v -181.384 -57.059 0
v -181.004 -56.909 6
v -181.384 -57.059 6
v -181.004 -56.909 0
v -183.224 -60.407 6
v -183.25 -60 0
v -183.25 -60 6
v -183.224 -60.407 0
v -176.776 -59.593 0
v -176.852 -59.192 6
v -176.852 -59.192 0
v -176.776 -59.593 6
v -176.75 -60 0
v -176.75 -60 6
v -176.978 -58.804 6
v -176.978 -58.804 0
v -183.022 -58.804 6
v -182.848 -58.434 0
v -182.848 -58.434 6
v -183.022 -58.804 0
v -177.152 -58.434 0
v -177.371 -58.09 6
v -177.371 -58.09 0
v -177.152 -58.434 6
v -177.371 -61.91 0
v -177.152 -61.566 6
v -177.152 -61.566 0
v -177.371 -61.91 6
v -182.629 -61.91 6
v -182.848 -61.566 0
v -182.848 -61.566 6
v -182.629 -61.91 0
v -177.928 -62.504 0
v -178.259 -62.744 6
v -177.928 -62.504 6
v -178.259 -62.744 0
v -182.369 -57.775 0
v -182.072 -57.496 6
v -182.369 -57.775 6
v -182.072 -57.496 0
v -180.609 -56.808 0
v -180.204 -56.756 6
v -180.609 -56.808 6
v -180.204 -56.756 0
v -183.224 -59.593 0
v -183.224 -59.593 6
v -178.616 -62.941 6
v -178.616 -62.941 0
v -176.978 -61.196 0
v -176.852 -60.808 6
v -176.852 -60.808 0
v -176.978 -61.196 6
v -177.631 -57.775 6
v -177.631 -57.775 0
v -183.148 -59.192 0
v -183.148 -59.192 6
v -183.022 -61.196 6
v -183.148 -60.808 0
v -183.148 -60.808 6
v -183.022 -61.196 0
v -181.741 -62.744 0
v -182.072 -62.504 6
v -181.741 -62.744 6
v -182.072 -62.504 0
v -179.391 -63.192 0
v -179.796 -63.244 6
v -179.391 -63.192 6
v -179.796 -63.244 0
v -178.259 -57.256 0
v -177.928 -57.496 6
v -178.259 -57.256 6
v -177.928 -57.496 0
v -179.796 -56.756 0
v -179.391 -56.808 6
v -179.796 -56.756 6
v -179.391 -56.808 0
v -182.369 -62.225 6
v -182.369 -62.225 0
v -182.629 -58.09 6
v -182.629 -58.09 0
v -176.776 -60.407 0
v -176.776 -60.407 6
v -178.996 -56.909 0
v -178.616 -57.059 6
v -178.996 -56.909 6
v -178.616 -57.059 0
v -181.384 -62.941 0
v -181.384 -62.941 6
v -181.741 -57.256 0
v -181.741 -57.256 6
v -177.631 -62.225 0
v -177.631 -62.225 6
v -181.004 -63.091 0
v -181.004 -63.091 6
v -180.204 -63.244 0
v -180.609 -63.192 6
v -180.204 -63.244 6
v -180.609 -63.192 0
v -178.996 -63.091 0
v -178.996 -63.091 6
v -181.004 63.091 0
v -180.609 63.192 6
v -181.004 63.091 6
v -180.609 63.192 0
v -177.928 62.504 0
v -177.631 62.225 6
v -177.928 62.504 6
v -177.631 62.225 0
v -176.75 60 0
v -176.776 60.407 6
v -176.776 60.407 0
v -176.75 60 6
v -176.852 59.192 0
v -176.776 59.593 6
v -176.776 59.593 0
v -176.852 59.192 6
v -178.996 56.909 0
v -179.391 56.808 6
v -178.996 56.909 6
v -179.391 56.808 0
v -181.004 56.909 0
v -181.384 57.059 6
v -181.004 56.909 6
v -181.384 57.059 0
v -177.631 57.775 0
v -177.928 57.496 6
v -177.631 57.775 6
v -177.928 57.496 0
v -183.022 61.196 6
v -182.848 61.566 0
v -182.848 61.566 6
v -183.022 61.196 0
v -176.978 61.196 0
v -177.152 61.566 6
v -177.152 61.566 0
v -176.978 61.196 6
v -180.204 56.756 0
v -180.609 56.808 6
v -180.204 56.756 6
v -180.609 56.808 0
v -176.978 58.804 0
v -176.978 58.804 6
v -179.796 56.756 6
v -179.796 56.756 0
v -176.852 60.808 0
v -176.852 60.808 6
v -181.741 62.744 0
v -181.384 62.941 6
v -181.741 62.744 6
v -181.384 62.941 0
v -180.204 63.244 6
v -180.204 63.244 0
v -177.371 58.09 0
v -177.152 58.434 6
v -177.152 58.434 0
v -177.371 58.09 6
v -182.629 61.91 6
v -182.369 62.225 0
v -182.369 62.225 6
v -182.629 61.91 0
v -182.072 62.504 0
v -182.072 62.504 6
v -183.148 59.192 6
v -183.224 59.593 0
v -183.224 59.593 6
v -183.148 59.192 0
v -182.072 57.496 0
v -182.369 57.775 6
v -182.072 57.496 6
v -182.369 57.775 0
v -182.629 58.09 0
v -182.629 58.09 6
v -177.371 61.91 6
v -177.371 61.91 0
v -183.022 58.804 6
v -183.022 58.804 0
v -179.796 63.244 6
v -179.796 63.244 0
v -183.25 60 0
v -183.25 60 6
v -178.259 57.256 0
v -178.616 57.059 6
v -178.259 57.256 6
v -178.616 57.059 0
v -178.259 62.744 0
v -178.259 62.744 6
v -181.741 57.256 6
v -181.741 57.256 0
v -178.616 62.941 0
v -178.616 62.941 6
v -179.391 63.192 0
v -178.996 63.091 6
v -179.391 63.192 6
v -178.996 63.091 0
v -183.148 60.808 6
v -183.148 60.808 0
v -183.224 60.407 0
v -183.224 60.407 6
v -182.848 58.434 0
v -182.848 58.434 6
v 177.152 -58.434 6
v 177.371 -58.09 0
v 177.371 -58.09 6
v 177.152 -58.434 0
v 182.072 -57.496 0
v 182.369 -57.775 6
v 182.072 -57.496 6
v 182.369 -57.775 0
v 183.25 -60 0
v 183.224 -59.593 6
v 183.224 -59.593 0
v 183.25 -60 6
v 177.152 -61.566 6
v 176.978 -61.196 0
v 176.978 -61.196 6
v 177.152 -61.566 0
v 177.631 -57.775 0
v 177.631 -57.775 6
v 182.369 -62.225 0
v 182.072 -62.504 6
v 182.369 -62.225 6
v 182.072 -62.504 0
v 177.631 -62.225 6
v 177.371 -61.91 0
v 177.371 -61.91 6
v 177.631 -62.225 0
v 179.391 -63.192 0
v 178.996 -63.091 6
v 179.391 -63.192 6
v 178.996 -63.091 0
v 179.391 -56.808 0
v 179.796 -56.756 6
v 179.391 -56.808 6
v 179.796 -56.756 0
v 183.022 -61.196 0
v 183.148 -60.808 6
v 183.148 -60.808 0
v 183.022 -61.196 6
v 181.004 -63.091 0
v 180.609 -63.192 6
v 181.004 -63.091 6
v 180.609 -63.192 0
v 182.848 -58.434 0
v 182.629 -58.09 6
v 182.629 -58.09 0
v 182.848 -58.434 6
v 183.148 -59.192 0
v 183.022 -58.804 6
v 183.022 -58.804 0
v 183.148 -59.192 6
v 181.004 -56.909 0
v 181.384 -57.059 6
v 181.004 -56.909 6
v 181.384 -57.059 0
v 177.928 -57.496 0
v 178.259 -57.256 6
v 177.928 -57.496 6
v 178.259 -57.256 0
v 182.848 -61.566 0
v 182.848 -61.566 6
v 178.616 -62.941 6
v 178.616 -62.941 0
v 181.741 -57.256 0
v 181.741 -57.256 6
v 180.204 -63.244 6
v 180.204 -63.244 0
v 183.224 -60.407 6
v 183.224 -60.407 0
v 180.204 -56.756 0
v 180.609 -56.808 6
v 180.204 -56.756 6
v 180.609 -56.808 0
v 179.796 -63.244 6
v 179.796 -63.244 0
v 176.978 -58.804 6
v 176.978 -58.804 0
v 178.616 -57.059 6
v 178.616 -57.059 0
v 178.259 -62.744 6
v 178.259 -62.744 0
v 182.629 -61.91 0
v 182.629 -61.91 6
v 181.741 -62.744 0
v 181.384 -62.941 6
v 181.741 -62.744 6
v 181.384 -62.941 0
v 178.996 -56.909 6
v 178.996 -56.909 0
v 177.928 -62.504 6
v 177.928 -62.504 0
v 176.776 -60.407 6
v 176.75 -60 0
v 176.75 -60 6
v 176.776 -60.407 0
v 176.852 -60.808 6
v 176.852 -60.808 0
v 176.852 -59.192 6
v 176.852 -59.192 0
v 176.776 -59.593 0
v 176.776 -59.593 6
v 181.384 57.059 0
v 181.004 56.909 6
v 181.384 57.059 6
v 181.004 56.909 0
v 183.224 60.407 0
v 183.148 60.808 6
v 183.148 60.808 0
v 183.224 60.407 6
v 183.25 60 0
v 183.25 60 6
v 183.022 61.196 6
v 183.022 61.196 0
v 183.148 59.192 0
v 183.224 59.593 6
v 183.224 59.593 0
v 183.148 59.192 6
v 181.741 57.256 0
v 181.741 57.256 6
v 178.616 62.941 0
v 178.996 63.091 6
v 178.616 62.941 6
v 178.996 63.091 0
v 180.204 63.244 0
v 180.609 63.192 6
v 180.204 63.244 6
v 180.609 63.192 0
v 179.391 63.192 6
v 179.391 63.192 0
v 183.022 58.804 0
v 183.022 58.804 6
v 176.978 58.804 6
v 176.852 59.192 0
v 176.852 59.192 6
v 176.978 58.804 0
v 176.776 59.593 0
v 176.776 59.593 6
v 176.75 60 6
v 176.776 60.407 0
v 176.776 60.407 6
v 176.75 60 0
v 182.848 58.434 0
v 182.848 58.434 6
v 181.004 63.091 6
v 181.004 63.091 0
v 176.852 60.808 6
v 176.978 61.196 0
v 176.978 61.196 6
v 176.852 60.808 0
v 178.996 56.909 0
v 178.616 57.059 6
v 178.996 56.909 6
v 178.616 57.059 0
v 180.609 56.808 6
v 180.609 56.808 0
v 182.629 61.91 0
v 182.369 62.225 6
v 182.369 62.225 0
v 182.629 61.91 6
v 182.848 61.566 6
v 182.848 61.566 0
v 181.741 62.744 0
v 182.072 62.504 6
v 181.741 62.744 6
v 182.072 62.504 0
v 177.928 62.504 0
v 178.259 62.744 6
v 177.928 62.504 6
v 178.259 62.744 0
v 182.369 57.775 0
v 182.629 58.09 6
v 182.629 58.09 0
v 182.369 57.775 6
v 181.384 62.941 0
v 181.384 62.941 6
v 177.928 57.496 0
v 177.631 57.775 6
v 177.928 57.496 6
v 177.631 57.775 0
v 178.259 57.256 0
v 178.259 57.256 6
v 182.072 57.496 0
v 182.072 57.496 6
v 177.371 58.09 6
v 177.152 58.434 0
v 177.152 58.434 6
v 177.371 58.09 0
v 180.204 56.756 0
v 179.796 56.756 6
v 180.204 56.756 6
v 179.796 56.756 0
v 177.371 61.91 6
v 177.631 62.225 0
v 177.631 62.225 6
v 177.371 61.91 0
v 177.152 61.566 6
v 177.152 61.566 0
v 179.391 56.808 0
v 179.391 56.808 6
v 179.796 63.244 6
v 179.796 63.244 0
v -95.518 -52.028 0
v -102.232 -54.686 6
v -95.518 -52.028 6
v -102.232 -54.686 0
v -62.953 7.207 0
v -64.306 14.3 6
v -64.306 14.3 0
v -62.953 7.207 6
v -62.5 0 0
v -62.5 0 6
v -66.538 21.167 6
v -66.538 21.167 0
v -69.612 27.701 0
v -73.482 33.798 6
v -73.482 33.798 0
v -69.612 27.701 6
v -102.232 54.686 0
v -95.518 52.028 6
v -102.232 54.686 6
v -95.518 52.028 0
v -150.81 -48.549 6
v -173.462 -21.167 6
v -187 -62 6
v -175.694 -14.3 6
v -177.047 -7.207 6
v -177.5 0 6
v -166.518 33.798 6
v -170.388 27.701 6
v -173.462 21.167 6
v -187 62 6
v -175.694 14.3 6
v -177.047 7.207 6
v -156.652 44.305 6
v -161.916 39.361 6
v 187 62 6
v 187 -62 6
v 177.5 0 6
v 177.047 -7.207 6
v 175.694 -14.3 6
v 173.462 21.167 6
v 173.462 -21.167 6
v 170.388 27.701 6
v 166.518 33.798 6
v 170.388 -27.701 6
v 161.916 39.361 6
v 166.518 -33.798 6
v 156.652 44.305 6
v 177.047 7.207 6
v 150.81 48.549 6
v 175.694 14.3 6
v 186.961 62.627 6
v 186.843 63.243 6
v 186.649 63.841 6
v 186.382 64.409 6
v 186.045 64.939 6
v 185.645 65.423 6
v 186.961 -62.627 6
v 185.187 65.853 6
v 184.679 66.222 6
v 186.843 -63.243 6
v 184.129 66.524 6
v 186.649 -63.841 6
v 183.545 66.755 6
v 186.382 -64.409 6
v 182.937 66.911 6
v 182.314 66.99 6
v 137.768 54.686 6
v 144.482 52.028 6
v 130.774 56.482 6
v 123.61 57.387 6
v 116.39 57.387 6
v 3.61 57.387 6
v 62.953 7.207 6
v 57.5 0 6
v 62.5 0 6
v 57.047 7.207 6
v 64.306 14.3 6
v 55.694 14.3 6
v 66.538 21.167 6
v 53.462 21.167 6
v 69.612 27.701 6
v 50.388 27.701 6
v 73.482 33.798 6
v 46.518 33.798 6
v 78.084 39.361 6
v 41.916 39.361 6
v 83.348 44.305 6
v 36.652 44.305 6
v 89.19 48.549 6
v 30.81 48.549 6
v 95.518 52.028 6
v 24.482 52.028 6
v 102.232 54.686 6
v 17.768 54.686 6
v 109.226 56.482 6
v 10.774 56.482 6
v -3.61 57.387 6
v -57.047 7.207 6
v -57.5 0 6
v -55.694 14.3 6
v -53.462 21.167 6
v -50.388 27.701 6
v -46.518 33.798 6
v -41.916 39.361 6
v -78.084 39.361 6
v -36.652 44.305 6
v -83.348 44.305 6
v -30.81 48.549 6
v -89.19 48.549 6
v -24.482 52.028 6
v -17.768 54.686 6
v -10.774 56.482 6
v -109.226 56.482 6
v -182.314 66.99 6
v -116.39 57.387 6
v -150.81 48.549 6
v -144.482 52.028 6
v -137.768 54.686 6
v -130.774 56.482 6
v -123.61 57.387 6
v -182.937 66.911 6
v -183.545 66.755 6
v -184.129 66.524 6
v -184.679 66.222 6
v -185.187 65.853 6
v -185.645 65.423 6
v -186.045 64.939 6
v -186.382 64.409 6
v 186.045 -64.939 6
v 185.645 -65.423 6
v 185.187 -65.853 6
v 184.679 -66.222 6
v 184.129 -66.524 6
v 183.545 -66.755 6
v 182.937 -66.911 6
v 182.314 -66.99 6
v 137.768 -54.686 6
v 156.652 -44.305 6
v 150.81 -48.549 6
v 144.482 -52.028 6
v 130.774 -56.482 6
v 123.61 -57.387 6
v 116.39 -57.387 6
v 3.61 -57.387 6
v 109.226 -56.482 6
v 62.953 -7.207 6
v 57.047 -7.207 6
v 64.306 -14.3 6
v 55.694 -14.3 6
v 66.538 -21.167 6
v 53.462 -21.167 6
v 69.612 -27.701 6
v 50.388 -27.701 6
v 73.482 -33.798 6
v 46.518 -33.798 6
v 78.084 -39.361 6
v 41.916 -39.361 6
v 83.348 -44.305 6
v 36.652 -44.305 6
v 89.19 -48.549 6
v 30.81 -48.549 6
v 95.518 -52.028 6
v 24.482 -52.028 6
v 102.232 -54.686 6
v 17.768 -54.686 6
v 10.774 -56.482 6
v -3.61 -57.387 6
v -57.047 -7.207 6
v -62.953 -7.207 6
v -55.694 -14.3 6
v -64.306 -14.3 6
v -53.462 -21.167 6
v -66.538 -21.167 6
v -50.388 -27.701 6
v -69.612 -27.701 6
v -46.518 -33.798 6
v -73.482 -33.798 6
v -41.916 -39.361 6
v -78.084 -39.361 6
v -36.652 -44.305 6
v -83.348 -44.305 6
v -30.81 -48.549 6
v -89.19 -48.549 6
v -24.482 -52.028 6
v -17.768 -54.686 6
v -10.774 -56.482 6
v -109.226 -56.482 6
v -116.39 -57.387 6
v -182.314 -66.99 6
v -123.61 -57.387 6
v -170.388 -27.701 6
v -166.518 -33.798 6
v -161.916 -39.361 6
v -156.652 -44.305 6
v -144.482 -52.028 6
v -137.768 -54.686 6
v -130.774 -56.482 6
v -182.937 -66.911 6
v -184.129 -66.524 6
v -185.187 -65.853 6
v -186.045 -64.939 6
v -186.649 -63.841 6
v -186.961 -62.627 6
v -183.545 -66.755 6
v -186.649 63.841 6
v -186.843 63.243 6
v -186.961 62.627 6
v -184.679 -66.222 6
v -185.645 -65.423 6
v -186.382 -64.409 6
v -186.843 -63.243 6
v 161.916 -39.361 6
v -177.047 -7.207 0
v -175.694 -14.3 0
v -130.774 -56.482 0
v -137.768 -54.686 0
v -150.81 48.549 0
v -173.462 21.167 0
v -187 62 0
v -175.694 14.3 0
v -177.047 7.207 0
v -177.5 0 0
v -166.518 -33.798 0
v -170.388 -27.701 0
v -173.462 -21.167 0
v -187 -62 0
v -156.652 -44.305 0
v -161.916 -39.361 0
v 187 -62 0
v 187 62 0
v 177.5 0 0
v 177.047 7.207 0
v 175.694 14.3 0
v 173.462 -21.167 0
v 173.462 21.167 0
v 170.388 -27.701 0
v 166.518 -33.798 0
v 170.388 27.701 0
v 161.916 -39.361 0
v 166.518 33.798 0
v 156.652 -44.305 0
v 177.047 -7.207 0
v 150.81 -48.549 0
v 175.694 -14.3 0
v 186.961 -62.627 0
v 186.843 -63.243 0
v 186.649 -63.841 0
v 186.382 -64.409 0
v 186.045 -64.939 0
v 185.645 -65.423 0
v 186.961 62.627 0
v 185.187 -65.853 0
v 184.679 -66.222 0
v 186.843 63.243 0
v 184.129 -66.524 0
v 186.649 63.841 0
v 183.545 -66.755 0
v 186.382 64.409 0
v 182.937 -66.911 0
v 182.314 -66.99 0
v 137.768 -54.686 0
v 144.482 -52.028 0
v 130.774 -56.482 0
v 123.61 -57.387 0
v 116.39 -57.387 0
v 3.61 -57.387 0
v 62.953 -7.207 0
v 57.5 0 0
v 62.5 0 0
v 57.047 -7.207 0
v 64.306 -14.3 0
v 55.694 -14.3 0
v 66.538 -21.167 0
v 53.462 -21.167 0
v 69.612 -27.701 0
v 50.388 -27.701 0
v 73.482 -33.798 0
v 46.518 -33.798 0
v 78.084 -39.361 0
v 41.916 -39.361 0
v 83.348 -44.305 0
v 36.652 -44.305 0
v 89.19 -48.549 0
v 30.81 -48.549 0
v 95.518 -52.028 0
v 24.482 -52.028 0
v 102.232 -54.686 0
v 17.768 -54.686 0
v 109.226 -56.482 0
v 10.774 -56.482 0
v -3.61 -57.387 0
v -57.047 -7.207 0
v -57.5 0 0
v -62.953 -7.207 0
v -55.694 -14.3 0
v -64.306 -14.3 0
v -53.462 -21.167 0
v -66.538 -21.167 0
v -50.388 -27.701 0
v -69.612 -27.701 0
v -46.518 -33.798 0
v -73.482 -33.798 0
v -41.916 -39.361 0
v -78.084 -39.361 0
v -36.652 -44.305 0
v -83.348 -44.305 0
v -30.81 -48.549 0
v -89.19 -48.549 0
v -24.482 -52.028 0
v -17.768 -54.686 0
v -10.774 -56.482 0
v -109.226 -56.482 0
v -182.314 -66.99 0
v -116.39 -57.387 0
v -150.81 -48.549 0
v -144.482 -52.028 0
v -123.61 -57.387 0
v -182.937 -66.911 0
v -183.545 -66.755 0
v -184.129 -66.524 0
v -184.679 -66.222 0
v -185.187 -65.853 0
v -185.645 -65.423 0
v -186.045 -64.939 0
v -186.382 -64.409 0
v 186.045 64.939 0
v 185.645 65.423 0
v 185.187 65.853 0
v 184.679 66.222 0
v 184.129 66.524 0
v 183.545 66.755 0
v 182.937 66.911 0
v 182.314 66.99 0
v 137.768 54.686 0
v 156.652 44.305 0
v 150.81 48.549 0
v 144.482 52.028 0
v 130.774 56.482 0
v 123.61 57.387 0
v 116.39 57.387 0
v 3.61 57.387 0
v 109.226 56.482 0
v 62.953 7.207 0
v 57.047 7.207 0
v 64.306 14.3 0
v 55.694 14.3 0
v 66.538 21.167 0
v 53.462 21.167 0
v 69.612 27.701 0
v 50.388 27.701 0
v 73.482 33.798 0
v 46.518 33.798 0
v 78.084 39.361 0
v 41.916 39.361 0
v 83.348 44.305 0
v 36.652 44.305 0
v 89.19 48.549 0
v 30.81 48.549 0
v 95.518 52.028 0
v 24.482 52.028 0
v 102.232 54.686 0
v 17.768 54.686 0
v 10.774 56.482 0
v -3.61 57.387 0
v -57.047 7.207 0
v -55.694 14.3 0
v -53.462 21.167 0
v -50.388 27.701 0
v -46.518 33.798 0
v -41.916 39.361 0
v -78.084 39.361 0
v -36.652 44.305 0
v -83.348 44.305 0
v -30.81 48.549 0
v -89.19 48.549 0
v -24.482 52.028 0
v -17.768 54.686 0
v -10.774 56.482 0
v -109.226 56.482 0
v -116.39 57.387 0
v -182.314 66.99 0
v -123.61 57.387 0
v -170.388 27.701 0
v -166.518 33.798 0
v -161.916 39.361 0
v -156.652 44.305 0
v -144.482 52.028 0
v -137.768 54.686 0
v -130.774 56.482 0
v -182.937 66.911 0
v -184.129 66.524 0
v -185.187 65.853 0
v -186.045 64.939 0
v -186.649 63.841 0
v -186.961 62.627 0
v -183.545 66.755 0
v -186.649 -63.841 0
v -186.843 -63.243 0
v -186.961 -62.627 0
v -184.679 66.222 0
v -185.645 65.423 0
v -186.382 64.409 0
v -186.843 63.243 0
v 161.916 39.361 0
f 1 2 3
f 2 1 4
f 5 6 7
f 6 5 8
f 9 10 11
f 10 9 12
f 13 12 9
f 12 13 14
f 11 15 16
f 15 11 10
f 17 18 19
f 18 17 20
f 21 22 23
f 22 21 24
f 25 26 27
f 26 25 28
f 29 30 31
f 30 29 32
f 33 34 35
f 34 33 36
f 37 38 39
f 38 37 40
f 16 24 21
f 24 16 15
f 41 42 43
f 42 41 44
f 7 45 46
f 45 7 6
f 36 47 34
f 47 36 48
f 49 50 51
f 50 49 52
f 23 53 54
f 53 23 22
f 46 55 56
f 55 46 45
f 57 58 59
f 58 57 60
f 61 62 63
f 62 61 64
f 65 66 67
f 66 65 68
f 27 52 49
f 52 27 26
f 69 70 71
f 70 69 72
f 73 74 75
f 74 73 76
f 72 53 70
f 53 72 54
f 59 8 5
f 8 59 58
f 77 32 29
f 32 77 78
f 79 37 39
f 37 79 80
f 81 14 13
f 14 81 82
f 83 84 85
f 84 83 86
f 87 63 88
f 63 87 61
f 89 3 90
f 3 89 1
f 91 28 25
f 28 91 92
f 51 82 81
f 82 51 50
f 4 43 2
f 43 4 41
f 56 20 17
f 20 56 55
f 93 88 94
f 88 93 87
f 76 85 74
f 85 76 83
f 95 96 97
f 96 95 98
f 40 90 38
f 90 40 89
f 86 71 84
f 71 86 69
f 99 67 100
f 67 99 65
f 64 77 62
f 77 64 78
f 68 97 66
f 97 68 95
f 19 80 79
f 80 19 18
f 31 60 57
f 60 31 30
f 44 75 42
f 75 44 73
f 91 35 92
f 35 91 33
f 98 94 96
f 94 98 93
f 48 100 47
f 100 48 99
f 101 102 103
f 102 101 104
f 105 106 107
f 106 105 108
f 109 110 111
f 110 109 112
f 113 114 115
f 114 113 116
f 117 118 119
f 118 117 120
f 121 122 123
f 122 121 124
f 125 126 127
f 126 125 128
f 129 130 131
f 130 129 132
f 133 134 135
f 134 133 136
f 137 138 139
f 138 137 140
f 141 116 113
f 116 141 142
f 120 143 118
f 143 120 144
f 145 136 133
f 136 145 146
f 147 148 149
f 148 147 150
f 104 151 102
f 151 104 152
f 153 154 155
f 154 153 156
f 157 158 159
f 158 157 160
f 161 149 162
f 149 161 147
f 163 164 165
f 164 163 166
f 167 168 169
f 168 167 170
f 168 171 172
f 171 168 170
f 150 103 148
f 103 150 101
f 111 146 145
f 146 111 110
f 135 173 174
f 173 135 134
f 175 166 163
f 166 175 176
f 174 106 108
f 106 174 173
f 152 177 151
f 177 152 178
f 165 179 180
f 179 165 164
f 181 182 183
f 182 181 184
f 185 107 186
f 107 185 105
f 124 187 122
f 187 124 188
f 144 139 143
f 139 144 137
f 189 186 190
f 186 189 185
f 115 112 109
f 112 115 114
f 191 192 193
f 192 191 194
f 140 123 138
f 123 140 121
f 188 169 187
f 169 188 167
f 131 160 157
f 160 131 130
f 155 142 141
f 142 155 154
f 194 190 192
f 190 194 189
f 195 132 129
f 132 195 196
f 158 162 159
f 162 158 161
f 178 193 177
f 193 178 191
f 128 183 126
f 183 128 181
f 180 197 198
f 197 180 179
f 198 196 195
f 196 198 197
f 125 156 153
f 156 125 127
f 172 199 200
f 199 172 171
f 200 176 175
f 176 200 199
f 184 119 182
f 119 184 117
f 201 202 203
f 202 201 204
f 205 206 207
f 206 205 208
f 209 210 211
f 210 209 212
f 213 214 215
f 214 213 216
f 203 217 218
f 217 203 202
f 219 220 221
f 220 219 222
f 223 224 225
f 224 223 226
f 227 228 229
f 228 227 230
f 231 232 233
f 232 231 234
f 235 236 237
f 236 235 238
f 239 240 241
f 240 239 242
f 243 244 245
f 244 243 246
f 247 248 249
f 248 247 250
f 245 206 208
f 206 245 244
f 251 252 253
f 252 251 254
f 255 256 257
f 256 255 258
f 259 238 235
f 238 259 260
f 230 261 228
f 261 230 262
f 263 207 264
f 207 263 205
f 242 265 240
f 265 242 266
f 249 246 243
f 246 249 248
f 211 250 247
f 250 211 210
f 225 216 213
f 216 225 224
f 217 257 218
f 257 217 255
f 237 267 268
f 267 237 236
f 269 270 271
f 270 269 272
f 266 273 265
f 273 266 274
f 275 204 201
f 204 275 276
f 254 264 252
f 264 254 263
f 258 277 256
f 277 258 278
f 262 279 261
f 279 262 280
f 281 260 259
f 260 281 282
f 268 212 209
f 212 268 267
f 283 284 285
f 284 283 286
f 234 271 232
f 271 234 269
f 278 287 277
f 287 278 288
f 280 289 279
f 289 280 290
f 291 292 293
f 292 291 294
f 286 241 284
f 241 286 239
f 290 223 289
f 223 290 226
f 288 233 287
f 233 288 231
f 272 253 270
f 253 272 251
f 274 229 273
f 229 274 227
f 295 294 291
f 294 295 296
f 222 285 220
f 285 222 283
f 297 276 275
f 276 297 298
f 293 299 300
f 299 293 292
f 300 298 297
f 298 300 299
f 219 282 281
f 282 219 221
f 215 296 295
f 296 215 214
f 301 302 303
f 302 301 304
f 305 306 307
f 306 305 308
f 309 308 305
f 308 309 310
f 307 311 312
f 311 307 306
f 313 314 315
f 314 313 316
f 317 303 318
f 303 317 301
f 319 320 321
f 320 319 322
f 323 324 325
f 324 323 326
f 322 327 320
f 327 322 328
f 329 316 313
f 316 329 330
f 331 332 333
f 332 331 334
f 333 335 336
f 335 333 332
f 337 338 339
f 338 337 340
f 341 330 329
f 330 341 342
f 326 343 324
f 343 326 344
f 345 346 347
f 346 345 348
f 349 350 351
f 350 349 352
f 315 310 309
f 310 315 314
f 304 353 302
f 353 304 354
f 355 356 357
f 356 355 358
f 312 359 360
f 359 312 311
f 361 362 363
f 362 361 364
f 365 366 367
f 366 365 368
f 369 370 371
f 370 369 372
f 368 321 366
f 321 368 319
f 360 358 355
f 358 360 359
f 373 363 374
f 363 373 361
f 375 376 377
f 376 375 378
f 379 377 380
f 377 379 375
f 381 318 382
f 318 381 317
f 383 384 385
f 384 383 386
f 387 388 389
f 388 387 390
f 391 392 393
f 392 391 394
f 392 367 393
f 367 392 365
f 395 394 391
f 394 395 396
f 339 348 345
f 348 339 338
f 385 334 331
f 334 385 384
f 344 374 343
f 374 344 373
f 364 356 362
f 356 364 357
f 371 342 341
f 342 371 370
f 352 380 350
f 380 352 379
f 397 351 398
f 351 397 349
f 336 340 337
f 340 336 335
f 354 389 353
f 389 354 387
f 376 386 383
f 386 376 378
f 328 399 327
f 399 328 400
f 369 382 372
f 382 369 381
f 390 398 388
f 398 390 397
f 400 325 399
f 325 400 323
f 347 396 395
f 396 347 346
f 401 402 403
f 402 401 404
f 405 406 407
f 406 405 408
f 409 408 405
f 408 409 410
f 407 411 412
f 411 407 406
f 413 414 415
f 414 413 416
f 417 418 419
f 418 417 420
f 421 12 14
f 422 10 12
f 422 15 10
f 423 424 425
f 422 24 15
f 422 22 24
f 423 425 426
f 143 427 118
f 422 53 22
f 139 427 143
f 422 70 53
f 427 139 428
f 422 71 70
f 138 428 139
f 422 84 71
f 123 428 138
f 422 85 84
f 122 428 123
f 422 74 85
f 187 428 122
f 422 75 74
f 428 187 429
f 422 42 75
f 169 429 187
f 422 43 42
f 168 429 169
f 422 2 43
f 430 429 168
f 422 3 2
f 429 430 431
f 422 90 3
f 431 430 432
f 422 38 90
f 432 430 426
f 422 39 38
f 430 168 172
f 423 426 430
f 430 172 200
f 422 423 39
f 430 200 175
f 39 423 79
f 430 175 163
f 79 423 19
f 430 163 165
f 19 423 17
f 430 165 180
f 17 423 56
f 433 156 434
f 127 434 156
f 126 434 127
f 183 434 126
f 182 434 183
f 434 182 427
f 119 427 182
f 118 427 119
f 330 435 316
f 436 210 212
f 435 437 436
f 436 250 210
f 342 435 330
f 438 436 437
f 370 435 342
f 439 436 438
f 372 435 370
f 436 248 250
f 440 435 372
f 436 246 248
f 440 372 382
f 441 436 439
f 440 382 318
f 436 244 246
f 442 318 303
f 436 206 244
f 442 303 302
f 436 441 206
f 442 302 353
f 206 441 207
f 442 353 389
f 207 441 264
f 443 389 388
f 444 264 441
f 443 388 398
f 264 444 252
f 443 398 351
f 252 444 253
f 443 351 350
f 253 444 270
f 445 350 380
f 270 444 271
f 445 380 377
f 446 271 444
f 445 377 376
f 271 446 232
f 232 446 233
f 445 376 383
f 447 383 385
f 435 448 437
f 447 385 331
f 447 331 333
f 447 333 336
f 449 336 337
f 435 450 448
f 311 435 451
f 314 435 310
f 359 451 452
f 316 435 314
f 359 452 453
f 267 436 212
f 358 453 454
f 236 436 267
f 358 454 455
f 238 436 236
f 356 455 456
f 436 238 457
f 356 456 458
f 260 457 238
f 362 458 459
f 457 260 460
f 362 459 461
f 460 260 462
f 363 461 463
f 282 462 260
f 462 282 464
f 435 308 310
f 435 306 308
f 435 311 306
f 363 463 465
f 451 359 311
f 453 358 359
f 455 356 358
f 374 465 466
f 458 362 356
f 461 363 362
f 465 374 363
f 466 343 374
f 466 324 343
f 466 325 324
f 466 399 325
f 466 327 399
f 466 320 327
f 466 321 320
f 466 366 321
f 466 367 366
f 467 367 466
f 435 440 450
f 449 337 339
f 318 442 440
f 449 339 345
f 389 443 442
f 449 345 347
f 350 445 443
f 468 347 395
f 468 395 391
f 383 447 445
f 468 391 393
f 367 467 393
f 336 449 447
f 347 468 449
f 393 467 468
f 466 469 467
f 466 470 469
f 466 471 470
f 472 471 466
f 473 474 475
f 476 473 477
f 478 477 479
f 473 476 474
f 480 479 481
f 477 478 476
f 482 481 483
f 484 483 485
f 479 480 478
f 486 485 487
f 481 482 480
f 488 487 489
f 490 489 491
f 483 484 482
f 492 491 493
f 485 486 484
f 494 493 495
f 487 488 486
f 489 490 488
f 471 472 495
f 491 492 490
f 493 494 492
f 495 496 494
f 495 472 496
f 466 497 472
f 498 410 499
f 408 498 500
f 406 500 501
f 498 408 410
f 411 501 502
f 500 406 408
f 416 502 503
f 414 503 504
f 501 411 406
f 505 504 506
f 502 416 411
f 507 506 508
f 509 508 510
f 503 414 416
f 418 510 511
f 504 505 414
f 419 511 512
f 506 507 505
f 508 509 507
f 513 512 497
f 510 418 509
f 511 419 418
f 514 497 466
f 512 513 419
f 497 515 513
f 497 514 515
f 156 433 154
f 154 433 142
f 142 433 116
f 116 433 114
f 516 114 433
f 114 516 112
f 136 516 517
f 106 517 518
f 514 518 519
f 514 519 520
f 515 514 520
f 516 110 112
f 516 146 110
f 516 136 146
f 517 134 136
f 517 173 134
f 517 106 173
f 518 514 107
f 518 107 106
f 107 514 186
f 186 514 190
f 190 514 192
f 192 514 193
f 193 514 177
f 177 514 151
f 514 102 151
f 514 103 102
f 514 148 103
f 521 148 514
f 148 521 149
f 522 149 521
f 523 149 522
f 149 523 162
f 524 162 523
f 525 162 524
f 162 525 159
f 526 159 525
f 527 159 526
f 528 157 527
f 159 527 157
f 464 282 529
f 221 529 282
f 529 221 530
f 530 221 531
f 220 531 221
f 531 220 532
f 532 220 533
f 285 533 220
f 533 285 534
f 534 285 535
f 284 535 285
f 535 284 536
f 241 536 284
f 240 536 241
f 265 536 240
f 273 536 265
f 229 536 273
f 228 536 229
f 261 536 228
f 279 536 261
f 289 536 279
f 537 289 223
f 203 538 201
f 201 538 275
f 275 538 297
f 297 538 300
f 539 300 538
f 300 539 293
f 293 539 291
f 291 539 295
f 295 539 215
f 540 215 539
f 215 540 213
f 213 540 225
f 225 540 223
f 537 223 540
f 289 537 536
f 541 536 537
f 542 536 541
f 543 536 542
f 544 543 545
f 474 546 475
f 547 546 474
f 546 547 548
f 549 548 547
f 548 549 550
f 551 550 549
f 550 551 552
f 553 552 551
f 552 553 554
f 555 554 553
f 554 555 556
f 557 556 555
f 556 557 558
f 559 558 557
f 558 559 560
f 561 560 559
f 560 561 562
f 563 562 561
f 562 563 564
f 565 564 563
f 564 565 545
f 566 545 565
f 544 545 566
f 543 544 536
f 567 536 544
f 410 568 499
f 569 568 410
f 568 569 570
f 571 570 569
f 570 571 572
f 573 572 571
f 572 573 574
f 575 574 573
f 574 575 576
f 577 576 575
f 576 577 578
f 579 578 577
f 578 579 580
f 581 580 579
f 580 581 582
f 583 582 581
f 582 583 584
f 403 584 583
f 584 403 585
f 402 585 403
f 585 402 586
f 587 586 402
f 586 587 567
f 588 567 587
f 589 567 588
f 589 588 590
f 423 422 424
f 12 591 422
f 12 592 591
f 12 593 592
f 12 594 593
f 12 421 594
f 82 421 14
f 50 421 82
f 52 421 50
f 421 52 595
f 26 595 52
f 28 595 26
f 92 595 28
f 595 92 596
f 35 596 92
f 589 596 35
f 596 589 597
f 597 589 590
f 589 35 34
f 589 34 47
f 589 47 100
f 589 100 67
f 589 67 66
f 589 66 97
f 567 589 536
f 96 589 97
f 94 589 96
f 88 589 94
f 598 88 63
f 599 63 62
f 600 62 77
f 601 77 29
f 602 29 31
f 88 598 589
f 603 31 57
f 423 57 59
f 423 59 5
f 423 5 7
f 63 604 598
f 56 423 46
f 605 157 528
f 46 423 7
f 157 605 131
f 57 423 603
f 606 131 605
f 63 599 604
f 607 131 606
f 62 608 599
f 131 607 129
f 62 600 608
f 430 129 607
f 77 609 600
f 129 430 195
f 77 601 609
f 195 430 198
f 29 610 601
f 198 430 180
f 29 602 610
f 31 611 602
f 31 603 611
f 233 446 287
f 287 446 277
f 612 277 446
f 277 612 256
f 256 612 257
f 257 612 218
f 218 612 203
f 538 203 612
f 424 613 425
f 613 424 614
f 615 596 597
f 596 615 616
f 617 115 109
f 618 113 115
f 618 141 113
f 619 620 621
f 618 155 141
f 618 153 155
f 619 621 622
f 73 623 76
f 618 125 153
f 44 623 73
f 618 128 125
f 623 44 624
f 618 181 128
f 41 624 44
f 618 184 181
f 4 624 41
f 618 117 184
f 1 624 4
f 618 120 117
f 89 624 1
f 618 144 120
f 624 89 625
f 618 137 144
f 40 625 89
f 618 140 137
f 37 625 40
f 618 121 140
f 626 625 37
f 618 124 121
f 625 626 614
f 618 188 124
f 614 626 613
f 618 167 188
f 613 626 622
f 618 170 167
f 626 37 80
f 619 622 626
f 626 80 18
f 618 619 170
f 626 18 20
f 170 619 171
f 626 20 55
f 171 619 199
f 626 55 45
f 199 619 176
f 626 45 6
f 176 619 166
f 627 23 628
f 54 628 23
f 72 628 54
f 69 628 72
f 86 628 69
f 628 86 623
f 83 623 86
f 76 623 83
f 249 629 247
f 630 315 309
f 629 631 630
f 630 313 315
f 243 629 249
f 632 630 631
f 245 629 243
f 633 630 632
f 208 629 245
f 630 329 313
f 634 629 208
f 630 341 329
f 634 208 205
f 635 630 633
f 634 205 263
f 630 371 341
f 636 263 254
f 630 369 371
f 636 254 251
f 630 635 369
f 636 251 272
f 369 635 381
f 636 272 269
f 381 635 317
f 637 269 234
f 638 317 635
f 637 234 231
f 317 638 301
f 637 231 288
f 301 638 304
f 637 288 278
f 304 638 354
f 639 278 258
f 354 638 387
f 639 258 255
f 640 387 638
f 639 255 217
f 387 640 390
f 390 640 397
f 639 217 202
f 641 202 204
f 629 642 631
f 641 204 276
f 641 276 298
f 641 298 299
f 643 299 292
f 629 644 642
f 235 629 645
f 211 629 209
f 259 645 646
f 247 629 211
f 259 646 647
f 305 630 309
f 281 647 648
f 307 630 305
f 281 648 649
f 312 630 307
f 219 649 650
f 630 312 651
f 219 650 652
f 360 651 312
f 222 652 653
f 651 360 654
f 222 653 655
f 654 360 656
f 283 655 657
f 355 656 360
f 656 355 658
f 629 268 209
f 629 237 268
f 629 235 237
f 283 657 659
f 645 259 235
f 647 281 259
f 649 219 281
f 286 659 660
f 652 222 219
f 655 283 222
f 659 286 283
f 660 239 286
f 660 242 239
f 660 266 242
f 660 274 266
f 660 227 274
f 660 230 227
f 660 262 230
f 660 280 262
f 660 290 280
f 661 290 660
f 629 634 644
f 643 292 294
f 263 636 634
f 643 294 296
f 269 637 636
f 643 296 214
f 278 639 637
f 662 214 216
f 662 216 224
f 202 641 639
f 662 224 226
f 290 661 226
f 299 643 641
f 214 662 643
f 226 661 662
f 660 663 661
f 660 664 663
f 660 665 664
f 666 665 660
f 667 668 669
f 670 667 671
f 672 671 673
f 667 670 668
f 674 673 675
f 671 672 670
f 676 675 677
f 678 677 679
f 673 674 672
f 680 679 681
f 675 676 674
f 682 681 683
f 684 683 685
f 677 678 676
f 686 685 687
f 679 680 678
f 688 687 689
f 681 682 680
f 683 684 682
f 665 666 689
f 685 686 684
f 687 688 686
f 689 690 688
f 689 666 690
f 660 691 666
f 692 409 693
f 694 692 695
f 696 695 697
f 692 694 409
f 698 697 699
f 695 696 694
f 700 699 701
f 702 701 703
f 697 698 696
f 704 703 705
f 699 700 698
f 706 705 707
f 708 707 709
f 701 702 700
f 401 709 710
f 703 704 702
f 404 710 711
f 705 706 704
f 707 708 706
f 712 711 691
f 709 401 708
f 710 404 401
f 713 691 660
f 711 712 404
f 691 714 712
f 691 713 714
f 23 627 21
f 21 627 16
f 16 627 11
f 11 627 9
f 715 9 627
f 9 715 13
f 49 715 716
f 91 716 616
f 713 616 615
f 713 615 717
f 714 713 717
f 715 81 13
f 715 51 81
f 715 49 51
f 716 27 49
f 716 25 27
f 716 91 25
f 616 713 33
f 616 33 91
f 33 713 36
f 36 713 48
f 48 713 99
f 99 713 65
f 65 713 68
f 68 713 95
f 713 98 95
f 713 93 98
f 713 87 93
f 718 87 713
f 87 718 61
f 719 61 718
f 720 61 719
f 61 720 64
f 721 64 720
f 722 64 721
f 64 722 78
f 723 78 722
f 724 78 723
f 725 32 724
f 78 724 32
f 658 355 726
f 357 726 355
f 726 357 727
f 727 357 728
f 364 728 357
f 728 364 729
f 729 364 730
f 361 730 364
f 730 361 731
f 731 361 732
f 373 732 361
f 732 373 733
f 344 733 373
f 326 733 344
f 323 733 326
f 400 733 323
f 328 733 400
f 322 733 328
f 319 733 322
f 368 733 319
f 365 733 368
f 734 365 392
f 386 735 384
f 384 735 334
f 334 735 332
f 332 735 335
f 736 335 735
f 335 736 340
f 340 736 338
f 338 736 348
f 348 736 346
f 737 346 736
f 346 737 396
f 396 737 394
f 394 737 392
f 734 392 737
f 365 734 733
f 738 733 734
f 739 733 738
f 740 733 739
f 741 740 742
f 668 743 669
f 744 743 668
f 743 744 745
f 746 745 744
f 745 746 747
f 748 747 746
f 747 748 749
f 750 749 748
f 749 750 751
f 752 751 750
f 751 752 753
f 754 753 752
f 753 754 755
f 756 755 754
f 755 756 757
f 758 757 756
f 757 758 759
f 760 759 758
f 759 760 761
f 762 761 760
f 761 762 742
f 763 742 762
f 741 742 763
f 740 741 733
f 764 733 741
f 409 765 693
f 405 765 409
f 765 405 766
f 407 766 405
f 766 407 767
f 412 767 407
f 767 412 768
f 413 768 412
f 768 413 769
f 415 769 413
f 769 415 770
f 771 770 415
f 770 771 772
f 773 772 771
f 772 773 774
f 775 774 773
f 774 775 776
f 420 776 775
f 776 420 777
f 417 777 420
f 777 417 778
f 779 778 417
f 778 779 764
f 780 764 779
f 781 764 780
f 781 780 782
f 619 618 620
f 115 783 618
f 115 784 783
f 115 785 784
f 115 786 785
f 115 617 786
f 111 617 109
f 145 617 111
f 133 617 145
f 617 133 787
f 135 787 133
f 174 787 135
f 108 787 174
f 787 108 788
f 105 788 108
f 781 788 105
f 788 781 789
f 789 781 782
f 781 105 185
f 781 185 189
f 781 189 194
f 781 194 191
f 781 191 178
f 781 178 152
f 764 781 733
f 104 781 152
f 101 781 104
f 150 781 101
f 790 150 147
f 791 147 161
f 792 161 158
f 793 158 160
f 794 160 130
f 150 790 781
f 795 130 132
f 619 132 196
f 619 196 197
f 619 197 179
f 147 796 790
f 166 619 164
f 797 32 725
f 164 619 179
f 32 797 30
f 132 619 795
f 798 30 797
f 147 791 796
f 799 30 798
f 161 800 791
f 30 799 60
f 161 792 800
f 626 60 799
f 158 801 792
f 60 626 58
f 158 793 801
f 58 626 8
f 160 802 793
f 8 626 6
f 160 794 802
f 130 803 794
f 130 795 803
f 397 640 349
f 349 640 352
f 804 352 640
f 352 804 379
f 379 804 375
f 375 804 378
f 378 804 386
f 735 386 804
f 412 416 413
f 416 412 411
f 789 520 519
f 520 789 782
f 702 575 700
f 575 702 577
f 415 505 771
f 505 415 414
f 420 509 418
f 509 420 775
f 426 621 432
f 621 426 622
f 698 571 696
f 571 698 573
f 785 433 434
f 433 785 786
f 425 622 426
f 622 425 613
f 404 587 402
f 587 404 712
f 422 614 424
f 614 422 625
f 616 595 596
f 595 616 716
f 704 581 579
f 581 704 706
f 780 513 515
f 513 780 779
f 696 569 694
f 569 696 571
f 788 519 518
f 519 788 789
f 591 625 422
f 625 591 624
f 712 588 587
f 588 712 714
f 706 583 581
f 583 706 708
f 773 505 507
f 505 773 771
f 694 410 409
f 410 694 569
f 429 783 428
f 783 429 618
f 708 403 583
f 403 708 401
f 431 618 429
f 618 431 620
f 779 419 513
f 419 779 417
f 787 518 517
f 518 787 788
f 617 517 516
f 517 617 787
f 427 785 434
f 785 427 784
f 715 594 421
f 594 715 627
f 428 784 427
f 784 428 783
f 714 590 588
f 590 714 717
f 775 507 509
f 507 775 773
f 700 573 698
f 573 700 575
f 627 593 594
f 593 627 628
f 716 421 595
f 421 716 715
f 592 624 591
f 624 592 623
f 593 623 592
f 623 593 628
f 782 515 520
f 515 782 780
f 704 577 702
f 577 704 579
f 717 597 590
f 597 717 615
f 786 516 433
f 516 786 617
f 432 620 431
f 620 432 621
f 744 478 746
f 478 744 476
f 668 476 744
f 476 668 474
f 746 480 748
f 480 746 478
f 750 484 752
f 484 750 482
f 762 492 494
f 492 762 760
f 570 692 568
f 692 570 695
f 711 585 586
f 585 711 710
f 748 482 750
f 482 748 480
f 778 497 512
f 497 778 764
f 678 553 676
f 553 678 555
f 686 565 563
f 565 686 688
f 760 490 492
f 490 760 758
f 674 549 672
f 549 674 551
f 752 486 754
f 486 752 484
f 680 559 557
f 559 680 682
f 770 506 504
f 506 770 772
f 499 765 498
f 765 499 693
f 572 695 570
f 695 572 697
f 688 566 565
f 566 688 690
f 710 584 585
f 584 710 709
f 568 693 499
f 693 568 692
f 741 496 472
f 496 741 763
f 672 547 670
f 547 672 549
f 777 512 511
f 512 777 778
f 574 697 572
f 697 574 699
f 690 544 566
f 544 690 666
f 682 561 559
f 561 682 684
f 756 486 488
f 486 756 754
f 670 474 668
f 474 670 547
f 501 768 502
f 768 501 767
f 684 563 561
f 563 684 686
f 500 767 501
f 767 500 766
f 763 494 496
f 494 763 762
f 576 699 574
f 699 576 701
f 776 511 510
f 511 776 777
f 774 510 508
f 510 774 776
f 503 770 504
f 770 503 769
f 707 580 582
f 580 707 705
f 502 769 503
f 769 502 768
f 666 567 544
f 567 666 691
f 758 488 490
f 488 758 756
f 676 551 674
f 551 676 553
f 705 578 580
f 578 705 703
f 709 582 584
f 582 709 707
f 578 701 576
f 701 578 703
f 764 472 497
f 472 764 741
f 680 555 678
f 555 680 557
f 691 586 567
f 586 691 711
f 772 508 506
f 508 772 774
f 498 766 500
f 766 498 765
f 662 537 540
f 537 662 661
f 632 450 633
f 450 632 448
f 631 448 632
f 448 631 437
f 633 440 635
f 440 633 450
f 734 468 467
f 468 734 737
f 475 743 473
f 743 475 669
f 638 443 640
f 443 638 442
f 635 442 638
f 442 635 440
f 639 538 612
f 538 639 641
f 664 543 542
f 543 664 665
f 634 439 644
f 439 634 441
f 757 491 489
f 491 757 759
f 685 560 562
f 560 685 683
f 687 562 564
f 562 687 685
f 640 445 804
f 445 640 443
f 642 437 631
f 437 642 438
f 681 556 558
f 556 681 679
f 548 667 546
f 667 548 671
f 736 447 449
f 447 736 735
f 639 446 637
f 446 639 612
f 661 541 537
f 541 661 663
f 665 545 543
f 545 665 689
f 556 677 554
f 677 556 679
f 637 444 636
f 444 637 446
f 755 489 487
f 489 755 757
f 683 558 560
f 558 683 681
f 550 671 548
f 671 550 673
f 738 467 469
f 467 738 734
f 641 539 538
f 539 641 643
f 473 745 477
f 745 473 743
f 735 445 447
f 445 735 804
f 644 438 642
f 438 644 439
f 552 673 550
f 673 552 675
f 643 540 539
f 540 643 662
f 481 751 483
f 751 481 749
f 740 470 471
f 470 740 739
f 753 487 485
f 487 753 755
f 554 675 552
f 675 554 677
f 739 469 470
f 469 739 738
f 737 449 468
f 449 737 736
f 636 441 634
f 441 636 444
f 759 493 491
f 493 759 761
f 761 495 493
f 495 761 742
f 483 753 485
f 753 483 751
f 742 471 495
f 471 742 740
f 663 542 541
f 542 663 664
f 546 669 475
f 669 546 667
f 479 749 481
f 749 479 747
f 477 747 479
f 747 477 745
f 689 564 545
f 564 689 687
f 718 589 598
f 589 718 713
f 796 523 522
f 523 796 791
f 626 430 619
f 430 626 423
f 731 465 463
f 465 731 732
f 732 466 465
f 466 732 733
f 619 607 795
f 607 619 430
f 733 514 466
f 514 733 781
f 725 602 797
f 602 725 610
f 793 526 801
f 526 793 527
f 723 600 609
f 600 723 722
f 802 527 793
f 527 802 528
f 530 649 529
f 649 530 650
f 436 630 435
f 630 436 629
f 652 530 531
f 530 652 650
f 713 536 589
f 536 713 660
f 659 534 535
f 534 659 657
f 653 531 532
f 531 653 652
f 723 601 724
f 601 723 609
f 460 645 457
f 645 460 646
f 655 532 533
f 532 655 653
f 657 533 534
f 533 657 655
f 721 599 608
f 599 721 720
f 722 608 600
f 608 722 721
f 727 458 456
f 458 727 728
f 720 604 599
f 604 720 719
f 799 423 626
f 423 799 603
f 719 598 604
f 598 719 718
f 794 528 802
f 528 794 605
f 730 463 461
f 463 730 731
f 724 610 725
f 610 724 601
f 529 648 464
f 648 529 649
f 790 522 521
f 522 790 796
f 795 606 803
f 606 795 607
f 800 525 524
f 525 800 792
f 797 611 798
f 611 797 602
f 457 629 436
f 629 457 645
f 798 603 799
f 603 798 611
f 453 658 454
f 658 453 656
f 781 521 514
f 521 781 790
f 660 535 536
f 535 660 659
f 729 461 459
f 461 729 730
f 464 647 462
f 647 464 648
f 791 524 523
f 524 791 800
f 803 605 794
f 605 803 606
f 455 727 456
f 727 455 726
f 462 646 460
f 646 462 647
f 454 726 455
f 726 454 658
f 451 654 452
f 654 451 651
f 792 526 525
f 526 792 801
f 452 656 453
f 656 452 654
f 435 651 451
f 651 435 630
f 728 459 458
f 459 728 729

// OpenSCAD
$fn = 50;


difference() {
	union() {
		hull() {
			translate(v = [-182.0000000000, 62.0000000000, 0]) {
				cylinder(h = 6, r = 5);
			}
			translate(v = [182.0000000000, 62.0000000000, 0]) {
				cylinder(h = 6, r = 5);
			}
			translate(v = [-182.0000000000, -62.0000000000, 0]) {
				cylinder(h = 6, r = 5);
			}
			translate(v = [182.0000000000, -62.0000000000, 0]) {
				cylinder(h = 6, r = 5);
			}
		}
	}
	union() {
		#translate(v = [-180.0000000000, -60.0000000000, -100.0000000000]) {
			cylinder(h = 200, r = 3.2500000000);
		}
		#translate(v = [-180.0000000000, 60.0000000000, -100.0000000000]) {
			cylinder(h = 200, r = 3.2500000000);
		}
		#translate(v = [180.0000000000, -60.0000000000, -100.0000000000]) {
			cylinder(h = 200, r = 3.2500000000);
		}
		#translate(v = [180.0000000000, 60.0000000000, -100.0000000000]) {
			cylinder(h = 200, r = 3.2500000000);
		}
		#translate(v = [-120.0000000000, 0, 0]) {
			cylinder(h = 6, r = 57.5000000000);
		}
		#cylinder(h = 6, r = 57.5000000000);
		#translate(v = [120.0000000000, 0, 0]) {
			cylinder(h = 6, r = 57.5000000000);
		}
	}
}
